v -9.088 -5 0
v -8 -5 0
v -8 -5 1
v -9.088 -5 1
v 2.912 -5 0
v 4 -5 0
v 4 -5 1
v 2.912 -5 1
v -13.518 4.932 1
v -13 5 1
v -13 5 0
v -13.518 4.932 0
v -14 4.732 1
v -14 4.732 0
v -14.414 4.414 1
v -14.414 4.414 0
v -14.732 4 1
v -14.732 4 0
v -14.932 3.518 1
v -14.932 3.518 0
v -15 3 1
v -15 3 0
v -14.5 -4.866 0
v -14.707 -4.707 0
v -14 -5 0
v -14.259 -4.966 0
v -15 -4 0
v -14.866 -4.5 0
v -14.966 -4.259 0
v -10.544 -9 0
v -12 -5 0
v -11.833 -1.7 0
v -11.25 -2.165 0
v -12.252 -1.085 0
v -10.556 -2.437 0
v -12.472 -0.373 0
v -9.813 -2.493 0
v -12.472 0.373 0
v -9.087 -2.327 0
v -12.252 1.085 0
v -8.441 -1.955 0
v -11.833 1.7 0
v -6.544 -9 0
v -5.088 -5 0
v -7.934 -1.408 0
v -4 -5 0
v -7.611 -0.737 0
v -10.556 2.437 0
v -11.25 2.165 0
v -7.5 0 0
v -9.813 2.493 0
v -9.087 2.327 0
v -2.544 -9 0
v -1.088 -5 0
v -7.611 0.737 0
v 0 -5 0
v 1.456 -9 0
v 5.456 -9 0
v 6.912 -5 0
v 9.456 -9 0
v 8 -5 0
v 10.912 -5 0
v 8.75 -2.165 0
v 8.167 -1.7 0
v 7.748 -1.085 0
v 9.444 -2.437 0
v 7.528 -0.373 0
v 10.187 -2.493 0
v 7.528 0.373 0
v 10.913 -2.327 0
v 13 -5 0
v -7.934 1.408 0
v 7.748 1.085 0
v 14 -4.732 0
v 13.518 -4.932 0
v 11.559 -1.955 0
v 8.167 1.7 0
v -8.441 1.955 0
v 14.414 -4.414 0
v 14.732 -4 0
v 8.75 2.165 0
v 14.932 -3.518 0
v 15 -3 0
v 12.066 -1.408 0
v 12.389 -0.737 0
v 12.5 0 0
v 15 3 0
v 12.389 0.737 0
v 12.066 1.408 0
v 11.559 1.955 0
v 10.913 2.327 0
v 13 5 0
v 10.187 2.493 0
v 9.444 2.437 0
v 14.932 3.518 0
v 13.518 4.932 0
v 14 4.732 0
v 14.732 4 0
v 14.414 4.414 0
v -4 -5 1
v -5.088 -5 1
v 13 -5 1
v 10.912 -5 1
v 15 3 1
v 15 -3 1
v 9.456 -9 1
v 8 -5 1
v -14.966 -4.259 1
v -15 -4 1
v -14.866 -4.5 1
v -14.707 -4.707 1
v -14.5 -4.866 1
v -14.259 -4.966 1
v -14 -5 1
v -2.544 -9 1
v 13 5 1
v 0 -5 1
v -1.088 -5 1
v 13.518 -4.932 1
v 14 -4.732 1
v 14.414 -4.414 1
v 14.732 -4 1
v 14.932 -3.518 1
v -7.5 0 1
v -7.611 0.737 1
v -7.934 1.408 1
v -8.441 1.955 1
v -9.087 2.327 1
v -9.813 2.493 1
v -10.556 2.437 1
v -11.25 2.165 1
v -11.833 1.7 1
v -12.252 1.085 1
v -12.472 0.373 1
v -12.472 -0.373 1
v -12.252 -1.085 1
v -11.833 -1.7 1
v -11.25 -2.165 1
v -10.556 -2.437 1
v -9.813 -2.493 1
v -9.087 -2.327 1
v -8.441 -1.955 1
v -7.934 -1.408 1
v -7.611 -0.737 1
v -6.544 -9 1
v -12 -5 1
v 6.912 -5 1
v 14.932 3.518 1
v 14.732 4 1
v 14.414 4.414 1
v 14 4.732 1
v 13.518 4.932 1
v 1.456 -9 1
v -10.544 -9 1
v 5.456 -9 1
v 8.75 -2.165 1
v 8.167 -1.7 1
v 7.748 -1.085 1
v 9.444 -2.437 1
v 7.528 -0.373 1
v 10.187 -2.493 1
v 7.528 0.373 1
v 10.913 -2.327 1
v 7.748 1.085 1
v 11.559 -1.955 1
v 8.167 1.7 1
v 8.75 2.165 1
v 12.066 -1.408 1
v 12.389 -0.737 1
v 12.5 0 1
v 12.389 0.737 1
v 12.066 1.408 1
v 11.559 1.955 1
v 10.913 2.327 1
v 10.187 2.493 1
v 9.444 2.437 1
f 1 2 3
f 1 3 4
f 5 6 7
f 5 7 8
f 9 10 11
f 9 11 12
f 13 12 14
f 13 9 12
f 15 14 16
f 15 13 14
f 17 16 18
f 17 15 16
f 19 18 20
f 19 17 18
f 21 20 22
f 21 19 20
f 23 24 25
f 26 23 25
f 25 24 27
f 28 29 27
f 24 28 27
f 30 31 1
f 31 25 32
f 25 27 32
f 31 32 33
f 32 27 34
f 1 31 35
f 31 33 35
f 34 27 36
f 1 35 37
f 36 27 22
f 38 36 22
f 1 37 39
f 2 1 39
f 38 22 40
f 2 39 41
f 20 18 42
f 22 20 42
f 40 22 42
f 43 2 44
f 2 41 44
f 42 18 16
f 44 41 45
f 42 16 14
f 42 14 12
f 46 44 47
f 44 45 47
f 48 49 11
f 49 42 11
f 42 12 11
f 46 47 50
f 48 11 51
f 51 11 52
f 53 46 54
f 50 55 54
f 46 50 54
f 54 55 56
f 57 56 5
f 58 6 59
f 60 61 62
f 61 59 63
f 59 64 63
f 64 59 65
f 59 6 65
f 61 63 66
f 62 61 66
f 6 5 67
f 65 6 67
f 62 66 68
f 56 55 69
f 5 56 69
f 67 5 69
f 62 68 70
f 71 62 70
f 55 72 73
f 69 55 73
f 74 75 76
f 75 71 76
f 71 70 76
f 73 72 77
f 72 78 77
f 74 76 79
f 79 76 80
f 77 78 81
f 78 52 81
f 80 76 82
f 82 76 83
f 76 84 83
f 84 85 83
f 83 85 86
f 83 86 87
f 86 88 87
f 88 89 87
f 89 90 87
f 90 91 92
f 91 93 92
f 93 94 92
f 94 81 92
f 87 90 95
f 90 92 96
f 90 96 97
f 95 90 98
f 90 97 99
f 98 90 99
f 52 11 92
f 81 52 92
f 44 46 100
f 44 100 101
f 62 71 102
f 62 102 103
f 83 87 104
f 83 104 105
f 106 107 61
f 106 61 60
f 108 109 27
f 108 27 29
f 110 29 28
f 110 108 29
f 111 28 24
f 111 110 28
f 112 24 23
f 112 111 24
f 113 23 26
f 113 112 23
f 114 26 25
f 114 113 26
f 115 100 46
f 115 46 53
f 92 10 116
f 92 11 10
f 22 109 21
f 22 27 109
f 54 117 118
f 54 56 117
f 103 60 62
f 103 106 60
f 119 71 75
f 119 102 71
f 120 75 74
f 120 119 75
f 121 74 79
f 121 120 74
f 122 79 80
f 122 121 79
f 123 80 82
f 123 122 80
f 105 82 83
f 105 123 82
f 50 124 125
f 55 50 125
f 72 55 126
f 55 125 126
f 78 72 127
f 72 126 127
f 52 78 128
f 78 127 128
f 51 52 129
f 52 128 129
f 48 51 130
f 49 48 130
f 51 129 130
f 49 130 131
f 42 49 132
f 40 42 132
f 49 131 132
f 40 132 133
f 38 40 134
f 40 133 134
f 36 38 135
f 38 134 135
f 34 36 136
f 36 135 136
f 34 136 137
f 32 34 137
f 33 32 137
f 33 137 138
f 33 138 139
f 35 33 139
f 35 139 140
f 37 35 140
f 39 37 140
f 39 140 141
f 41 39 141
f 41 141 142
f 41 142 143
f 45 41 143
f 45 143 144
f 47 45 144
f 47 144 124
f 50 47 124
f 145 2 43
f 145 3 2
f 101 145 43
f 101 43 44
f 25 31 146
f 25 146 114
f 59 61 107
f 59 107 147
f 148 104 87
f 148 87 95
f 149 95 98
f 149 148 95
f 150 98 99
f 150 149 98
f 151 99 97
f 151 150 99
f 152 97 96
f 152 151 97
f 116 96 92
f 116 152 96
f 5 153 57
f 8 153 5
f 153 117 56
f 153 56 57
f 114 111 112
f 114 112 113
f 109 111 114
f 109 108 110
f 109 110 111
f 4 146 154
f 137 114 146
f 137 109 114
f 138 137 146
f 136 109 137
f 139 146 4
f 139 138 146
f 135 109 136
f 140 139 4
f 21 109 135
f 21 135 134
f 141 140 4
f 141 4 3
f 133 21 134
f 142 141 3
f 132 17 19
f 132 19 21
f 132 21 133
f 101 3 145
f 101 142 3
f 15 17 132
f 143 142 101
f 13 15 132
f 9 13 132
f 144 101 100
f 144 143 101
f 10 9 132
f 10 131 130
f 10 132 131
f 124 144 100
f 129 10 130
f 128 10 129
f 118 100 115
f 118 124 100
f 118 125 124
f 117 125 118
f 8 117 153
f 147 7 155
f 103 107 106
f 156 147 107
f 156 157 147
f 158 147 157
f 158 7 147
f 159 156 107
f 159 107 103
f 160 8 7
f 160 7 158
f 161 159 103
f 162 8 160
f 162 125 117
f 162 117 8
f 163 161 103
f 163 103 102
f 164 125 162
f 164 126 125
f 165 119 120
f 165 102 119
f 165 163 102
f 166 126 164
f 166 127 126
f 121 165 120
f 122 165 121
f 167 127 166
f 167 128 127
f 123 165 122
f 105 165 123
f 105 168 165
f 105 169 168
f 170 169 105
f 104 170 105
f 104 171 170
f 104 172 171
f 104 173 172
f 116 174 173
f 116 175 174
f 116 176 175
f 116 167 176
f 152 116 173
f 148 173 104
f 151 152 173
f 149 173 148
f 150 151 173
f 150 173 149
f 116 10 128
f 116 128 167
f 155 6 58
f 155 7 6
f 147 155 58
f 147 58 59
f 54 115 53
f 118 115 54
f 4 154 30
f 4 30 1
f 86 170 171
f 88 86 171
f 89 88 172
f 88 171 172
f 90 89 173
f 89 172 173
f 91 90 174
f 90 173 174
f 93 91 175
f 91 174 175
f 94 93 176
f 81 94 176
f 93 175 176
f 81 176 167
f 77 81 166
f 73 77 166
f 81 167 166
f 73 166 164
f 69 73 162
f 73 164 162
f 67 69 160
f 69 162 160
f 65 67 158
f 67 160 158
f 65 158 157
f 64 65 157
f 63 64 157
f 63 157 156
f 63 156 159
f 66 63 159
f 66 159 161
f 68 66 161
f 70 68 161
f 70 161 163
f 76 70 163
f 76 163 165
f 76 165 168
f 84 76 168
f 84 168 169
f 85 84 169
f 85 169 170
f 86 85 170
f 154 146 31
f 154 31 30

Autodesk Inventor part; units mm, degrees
ref_plane "YZ Plane" through (0, 0, 0) normal (1, 0, 0) x (0, 1, 0)
ref_plane "XZ Plane" through (0, 0, 0) normal (0, 1, 0) x (-1, 0, 0)
ref_plane "XY Plane" through (0, 0, 0) normal (0, 0, 1) x (1, 0, 0)
sketch "Sketch2" plane through (0, 0, 0) normal (0, 0, 1) x (1, 0, 0)
  line L0 (15, -5) -> (-15, -5)
  line L1 (-15, -5) -> (-15, 5)
  line L2 (-15, 5) -> (15, 5)
  line L3 (15, 5) -> (15, -5)
  line L4 (15, -5) -> (-15, 5) construction
  line L5 (-15, -5) -> (15, 5) construction
  point P0 (0, 0)
  dimension "d192" = 30
  dimension "d193" = 10
extrude "Extrusion1" add sketch "Sketch2" along normal blind 1
sketch "Sketch3" plane through (0, 0, 1) normal (0, 0, 1) x (1, 0, 0)
  circle A0 centre (-10, 0) radius 2.5
  line L0 (15, 5) -> (-15, 5) construction
  line L1 (-15, 5) -> (-15, -5) construction
  line L2 (-15, -5) -> (15, -5) construction
  line L3 (15, -5) -> (15, 5) construction
  point P0 (0, 0)
  dimension "d196" = 5
  dimension "d197" = 10
extrude "Extrusion2" cut sketch "Sketch3" against normal blind 1
sketch "Sketch4" plane through (0, 0, 1) normal (0, 0, 1) x (1, 0, 0)
  circle A0 centre (10, 0) radius 2.5
  point P0 (0, 0)
  dimension "d200" = 5
  dimension "d201" = 10
extrude "Extrusion3" cut sketch "Sketch4" against normal blind 1
sketch "Sketch5" plane through (0, 0, 1) normal (0, 0, 1) x (1, 0, 0)
  line L0 (-15, -5) -> (15, -5) construction
  line L1 (-15, -5) -> (15, -5) projected
  line L2 (-12, -5) -> (-10.5441, -9)
  line L3 (-10.5441, -9) -> (-9.0882, -5)
  point P0 (0, 0)
  dimension "d204" = 4
  dimension "d205" = 70
  dimension "d206" = 70
  dimension "d207" = 12
extrude "Extrusion4" add sketch "Sketch5" against normal blind 1
pattern_linear "Rectangular Pattern1" count 6 spacing 4 along (1, 0, 0) of "Extrusion4"
fillet "Fillet1" radius 2 1 edges at (-15, 5, 0.5)
fillet "Fillet2" radius 2 1 edges at (15, 5, 0.5)
fillet "Fillet3" radius 2 1 edges at (15, -5, 0.5)
fillet "Fillet4" radius 1 1 edges at (-15, -5, 0.5)
properties part number "50_sierra-01"
